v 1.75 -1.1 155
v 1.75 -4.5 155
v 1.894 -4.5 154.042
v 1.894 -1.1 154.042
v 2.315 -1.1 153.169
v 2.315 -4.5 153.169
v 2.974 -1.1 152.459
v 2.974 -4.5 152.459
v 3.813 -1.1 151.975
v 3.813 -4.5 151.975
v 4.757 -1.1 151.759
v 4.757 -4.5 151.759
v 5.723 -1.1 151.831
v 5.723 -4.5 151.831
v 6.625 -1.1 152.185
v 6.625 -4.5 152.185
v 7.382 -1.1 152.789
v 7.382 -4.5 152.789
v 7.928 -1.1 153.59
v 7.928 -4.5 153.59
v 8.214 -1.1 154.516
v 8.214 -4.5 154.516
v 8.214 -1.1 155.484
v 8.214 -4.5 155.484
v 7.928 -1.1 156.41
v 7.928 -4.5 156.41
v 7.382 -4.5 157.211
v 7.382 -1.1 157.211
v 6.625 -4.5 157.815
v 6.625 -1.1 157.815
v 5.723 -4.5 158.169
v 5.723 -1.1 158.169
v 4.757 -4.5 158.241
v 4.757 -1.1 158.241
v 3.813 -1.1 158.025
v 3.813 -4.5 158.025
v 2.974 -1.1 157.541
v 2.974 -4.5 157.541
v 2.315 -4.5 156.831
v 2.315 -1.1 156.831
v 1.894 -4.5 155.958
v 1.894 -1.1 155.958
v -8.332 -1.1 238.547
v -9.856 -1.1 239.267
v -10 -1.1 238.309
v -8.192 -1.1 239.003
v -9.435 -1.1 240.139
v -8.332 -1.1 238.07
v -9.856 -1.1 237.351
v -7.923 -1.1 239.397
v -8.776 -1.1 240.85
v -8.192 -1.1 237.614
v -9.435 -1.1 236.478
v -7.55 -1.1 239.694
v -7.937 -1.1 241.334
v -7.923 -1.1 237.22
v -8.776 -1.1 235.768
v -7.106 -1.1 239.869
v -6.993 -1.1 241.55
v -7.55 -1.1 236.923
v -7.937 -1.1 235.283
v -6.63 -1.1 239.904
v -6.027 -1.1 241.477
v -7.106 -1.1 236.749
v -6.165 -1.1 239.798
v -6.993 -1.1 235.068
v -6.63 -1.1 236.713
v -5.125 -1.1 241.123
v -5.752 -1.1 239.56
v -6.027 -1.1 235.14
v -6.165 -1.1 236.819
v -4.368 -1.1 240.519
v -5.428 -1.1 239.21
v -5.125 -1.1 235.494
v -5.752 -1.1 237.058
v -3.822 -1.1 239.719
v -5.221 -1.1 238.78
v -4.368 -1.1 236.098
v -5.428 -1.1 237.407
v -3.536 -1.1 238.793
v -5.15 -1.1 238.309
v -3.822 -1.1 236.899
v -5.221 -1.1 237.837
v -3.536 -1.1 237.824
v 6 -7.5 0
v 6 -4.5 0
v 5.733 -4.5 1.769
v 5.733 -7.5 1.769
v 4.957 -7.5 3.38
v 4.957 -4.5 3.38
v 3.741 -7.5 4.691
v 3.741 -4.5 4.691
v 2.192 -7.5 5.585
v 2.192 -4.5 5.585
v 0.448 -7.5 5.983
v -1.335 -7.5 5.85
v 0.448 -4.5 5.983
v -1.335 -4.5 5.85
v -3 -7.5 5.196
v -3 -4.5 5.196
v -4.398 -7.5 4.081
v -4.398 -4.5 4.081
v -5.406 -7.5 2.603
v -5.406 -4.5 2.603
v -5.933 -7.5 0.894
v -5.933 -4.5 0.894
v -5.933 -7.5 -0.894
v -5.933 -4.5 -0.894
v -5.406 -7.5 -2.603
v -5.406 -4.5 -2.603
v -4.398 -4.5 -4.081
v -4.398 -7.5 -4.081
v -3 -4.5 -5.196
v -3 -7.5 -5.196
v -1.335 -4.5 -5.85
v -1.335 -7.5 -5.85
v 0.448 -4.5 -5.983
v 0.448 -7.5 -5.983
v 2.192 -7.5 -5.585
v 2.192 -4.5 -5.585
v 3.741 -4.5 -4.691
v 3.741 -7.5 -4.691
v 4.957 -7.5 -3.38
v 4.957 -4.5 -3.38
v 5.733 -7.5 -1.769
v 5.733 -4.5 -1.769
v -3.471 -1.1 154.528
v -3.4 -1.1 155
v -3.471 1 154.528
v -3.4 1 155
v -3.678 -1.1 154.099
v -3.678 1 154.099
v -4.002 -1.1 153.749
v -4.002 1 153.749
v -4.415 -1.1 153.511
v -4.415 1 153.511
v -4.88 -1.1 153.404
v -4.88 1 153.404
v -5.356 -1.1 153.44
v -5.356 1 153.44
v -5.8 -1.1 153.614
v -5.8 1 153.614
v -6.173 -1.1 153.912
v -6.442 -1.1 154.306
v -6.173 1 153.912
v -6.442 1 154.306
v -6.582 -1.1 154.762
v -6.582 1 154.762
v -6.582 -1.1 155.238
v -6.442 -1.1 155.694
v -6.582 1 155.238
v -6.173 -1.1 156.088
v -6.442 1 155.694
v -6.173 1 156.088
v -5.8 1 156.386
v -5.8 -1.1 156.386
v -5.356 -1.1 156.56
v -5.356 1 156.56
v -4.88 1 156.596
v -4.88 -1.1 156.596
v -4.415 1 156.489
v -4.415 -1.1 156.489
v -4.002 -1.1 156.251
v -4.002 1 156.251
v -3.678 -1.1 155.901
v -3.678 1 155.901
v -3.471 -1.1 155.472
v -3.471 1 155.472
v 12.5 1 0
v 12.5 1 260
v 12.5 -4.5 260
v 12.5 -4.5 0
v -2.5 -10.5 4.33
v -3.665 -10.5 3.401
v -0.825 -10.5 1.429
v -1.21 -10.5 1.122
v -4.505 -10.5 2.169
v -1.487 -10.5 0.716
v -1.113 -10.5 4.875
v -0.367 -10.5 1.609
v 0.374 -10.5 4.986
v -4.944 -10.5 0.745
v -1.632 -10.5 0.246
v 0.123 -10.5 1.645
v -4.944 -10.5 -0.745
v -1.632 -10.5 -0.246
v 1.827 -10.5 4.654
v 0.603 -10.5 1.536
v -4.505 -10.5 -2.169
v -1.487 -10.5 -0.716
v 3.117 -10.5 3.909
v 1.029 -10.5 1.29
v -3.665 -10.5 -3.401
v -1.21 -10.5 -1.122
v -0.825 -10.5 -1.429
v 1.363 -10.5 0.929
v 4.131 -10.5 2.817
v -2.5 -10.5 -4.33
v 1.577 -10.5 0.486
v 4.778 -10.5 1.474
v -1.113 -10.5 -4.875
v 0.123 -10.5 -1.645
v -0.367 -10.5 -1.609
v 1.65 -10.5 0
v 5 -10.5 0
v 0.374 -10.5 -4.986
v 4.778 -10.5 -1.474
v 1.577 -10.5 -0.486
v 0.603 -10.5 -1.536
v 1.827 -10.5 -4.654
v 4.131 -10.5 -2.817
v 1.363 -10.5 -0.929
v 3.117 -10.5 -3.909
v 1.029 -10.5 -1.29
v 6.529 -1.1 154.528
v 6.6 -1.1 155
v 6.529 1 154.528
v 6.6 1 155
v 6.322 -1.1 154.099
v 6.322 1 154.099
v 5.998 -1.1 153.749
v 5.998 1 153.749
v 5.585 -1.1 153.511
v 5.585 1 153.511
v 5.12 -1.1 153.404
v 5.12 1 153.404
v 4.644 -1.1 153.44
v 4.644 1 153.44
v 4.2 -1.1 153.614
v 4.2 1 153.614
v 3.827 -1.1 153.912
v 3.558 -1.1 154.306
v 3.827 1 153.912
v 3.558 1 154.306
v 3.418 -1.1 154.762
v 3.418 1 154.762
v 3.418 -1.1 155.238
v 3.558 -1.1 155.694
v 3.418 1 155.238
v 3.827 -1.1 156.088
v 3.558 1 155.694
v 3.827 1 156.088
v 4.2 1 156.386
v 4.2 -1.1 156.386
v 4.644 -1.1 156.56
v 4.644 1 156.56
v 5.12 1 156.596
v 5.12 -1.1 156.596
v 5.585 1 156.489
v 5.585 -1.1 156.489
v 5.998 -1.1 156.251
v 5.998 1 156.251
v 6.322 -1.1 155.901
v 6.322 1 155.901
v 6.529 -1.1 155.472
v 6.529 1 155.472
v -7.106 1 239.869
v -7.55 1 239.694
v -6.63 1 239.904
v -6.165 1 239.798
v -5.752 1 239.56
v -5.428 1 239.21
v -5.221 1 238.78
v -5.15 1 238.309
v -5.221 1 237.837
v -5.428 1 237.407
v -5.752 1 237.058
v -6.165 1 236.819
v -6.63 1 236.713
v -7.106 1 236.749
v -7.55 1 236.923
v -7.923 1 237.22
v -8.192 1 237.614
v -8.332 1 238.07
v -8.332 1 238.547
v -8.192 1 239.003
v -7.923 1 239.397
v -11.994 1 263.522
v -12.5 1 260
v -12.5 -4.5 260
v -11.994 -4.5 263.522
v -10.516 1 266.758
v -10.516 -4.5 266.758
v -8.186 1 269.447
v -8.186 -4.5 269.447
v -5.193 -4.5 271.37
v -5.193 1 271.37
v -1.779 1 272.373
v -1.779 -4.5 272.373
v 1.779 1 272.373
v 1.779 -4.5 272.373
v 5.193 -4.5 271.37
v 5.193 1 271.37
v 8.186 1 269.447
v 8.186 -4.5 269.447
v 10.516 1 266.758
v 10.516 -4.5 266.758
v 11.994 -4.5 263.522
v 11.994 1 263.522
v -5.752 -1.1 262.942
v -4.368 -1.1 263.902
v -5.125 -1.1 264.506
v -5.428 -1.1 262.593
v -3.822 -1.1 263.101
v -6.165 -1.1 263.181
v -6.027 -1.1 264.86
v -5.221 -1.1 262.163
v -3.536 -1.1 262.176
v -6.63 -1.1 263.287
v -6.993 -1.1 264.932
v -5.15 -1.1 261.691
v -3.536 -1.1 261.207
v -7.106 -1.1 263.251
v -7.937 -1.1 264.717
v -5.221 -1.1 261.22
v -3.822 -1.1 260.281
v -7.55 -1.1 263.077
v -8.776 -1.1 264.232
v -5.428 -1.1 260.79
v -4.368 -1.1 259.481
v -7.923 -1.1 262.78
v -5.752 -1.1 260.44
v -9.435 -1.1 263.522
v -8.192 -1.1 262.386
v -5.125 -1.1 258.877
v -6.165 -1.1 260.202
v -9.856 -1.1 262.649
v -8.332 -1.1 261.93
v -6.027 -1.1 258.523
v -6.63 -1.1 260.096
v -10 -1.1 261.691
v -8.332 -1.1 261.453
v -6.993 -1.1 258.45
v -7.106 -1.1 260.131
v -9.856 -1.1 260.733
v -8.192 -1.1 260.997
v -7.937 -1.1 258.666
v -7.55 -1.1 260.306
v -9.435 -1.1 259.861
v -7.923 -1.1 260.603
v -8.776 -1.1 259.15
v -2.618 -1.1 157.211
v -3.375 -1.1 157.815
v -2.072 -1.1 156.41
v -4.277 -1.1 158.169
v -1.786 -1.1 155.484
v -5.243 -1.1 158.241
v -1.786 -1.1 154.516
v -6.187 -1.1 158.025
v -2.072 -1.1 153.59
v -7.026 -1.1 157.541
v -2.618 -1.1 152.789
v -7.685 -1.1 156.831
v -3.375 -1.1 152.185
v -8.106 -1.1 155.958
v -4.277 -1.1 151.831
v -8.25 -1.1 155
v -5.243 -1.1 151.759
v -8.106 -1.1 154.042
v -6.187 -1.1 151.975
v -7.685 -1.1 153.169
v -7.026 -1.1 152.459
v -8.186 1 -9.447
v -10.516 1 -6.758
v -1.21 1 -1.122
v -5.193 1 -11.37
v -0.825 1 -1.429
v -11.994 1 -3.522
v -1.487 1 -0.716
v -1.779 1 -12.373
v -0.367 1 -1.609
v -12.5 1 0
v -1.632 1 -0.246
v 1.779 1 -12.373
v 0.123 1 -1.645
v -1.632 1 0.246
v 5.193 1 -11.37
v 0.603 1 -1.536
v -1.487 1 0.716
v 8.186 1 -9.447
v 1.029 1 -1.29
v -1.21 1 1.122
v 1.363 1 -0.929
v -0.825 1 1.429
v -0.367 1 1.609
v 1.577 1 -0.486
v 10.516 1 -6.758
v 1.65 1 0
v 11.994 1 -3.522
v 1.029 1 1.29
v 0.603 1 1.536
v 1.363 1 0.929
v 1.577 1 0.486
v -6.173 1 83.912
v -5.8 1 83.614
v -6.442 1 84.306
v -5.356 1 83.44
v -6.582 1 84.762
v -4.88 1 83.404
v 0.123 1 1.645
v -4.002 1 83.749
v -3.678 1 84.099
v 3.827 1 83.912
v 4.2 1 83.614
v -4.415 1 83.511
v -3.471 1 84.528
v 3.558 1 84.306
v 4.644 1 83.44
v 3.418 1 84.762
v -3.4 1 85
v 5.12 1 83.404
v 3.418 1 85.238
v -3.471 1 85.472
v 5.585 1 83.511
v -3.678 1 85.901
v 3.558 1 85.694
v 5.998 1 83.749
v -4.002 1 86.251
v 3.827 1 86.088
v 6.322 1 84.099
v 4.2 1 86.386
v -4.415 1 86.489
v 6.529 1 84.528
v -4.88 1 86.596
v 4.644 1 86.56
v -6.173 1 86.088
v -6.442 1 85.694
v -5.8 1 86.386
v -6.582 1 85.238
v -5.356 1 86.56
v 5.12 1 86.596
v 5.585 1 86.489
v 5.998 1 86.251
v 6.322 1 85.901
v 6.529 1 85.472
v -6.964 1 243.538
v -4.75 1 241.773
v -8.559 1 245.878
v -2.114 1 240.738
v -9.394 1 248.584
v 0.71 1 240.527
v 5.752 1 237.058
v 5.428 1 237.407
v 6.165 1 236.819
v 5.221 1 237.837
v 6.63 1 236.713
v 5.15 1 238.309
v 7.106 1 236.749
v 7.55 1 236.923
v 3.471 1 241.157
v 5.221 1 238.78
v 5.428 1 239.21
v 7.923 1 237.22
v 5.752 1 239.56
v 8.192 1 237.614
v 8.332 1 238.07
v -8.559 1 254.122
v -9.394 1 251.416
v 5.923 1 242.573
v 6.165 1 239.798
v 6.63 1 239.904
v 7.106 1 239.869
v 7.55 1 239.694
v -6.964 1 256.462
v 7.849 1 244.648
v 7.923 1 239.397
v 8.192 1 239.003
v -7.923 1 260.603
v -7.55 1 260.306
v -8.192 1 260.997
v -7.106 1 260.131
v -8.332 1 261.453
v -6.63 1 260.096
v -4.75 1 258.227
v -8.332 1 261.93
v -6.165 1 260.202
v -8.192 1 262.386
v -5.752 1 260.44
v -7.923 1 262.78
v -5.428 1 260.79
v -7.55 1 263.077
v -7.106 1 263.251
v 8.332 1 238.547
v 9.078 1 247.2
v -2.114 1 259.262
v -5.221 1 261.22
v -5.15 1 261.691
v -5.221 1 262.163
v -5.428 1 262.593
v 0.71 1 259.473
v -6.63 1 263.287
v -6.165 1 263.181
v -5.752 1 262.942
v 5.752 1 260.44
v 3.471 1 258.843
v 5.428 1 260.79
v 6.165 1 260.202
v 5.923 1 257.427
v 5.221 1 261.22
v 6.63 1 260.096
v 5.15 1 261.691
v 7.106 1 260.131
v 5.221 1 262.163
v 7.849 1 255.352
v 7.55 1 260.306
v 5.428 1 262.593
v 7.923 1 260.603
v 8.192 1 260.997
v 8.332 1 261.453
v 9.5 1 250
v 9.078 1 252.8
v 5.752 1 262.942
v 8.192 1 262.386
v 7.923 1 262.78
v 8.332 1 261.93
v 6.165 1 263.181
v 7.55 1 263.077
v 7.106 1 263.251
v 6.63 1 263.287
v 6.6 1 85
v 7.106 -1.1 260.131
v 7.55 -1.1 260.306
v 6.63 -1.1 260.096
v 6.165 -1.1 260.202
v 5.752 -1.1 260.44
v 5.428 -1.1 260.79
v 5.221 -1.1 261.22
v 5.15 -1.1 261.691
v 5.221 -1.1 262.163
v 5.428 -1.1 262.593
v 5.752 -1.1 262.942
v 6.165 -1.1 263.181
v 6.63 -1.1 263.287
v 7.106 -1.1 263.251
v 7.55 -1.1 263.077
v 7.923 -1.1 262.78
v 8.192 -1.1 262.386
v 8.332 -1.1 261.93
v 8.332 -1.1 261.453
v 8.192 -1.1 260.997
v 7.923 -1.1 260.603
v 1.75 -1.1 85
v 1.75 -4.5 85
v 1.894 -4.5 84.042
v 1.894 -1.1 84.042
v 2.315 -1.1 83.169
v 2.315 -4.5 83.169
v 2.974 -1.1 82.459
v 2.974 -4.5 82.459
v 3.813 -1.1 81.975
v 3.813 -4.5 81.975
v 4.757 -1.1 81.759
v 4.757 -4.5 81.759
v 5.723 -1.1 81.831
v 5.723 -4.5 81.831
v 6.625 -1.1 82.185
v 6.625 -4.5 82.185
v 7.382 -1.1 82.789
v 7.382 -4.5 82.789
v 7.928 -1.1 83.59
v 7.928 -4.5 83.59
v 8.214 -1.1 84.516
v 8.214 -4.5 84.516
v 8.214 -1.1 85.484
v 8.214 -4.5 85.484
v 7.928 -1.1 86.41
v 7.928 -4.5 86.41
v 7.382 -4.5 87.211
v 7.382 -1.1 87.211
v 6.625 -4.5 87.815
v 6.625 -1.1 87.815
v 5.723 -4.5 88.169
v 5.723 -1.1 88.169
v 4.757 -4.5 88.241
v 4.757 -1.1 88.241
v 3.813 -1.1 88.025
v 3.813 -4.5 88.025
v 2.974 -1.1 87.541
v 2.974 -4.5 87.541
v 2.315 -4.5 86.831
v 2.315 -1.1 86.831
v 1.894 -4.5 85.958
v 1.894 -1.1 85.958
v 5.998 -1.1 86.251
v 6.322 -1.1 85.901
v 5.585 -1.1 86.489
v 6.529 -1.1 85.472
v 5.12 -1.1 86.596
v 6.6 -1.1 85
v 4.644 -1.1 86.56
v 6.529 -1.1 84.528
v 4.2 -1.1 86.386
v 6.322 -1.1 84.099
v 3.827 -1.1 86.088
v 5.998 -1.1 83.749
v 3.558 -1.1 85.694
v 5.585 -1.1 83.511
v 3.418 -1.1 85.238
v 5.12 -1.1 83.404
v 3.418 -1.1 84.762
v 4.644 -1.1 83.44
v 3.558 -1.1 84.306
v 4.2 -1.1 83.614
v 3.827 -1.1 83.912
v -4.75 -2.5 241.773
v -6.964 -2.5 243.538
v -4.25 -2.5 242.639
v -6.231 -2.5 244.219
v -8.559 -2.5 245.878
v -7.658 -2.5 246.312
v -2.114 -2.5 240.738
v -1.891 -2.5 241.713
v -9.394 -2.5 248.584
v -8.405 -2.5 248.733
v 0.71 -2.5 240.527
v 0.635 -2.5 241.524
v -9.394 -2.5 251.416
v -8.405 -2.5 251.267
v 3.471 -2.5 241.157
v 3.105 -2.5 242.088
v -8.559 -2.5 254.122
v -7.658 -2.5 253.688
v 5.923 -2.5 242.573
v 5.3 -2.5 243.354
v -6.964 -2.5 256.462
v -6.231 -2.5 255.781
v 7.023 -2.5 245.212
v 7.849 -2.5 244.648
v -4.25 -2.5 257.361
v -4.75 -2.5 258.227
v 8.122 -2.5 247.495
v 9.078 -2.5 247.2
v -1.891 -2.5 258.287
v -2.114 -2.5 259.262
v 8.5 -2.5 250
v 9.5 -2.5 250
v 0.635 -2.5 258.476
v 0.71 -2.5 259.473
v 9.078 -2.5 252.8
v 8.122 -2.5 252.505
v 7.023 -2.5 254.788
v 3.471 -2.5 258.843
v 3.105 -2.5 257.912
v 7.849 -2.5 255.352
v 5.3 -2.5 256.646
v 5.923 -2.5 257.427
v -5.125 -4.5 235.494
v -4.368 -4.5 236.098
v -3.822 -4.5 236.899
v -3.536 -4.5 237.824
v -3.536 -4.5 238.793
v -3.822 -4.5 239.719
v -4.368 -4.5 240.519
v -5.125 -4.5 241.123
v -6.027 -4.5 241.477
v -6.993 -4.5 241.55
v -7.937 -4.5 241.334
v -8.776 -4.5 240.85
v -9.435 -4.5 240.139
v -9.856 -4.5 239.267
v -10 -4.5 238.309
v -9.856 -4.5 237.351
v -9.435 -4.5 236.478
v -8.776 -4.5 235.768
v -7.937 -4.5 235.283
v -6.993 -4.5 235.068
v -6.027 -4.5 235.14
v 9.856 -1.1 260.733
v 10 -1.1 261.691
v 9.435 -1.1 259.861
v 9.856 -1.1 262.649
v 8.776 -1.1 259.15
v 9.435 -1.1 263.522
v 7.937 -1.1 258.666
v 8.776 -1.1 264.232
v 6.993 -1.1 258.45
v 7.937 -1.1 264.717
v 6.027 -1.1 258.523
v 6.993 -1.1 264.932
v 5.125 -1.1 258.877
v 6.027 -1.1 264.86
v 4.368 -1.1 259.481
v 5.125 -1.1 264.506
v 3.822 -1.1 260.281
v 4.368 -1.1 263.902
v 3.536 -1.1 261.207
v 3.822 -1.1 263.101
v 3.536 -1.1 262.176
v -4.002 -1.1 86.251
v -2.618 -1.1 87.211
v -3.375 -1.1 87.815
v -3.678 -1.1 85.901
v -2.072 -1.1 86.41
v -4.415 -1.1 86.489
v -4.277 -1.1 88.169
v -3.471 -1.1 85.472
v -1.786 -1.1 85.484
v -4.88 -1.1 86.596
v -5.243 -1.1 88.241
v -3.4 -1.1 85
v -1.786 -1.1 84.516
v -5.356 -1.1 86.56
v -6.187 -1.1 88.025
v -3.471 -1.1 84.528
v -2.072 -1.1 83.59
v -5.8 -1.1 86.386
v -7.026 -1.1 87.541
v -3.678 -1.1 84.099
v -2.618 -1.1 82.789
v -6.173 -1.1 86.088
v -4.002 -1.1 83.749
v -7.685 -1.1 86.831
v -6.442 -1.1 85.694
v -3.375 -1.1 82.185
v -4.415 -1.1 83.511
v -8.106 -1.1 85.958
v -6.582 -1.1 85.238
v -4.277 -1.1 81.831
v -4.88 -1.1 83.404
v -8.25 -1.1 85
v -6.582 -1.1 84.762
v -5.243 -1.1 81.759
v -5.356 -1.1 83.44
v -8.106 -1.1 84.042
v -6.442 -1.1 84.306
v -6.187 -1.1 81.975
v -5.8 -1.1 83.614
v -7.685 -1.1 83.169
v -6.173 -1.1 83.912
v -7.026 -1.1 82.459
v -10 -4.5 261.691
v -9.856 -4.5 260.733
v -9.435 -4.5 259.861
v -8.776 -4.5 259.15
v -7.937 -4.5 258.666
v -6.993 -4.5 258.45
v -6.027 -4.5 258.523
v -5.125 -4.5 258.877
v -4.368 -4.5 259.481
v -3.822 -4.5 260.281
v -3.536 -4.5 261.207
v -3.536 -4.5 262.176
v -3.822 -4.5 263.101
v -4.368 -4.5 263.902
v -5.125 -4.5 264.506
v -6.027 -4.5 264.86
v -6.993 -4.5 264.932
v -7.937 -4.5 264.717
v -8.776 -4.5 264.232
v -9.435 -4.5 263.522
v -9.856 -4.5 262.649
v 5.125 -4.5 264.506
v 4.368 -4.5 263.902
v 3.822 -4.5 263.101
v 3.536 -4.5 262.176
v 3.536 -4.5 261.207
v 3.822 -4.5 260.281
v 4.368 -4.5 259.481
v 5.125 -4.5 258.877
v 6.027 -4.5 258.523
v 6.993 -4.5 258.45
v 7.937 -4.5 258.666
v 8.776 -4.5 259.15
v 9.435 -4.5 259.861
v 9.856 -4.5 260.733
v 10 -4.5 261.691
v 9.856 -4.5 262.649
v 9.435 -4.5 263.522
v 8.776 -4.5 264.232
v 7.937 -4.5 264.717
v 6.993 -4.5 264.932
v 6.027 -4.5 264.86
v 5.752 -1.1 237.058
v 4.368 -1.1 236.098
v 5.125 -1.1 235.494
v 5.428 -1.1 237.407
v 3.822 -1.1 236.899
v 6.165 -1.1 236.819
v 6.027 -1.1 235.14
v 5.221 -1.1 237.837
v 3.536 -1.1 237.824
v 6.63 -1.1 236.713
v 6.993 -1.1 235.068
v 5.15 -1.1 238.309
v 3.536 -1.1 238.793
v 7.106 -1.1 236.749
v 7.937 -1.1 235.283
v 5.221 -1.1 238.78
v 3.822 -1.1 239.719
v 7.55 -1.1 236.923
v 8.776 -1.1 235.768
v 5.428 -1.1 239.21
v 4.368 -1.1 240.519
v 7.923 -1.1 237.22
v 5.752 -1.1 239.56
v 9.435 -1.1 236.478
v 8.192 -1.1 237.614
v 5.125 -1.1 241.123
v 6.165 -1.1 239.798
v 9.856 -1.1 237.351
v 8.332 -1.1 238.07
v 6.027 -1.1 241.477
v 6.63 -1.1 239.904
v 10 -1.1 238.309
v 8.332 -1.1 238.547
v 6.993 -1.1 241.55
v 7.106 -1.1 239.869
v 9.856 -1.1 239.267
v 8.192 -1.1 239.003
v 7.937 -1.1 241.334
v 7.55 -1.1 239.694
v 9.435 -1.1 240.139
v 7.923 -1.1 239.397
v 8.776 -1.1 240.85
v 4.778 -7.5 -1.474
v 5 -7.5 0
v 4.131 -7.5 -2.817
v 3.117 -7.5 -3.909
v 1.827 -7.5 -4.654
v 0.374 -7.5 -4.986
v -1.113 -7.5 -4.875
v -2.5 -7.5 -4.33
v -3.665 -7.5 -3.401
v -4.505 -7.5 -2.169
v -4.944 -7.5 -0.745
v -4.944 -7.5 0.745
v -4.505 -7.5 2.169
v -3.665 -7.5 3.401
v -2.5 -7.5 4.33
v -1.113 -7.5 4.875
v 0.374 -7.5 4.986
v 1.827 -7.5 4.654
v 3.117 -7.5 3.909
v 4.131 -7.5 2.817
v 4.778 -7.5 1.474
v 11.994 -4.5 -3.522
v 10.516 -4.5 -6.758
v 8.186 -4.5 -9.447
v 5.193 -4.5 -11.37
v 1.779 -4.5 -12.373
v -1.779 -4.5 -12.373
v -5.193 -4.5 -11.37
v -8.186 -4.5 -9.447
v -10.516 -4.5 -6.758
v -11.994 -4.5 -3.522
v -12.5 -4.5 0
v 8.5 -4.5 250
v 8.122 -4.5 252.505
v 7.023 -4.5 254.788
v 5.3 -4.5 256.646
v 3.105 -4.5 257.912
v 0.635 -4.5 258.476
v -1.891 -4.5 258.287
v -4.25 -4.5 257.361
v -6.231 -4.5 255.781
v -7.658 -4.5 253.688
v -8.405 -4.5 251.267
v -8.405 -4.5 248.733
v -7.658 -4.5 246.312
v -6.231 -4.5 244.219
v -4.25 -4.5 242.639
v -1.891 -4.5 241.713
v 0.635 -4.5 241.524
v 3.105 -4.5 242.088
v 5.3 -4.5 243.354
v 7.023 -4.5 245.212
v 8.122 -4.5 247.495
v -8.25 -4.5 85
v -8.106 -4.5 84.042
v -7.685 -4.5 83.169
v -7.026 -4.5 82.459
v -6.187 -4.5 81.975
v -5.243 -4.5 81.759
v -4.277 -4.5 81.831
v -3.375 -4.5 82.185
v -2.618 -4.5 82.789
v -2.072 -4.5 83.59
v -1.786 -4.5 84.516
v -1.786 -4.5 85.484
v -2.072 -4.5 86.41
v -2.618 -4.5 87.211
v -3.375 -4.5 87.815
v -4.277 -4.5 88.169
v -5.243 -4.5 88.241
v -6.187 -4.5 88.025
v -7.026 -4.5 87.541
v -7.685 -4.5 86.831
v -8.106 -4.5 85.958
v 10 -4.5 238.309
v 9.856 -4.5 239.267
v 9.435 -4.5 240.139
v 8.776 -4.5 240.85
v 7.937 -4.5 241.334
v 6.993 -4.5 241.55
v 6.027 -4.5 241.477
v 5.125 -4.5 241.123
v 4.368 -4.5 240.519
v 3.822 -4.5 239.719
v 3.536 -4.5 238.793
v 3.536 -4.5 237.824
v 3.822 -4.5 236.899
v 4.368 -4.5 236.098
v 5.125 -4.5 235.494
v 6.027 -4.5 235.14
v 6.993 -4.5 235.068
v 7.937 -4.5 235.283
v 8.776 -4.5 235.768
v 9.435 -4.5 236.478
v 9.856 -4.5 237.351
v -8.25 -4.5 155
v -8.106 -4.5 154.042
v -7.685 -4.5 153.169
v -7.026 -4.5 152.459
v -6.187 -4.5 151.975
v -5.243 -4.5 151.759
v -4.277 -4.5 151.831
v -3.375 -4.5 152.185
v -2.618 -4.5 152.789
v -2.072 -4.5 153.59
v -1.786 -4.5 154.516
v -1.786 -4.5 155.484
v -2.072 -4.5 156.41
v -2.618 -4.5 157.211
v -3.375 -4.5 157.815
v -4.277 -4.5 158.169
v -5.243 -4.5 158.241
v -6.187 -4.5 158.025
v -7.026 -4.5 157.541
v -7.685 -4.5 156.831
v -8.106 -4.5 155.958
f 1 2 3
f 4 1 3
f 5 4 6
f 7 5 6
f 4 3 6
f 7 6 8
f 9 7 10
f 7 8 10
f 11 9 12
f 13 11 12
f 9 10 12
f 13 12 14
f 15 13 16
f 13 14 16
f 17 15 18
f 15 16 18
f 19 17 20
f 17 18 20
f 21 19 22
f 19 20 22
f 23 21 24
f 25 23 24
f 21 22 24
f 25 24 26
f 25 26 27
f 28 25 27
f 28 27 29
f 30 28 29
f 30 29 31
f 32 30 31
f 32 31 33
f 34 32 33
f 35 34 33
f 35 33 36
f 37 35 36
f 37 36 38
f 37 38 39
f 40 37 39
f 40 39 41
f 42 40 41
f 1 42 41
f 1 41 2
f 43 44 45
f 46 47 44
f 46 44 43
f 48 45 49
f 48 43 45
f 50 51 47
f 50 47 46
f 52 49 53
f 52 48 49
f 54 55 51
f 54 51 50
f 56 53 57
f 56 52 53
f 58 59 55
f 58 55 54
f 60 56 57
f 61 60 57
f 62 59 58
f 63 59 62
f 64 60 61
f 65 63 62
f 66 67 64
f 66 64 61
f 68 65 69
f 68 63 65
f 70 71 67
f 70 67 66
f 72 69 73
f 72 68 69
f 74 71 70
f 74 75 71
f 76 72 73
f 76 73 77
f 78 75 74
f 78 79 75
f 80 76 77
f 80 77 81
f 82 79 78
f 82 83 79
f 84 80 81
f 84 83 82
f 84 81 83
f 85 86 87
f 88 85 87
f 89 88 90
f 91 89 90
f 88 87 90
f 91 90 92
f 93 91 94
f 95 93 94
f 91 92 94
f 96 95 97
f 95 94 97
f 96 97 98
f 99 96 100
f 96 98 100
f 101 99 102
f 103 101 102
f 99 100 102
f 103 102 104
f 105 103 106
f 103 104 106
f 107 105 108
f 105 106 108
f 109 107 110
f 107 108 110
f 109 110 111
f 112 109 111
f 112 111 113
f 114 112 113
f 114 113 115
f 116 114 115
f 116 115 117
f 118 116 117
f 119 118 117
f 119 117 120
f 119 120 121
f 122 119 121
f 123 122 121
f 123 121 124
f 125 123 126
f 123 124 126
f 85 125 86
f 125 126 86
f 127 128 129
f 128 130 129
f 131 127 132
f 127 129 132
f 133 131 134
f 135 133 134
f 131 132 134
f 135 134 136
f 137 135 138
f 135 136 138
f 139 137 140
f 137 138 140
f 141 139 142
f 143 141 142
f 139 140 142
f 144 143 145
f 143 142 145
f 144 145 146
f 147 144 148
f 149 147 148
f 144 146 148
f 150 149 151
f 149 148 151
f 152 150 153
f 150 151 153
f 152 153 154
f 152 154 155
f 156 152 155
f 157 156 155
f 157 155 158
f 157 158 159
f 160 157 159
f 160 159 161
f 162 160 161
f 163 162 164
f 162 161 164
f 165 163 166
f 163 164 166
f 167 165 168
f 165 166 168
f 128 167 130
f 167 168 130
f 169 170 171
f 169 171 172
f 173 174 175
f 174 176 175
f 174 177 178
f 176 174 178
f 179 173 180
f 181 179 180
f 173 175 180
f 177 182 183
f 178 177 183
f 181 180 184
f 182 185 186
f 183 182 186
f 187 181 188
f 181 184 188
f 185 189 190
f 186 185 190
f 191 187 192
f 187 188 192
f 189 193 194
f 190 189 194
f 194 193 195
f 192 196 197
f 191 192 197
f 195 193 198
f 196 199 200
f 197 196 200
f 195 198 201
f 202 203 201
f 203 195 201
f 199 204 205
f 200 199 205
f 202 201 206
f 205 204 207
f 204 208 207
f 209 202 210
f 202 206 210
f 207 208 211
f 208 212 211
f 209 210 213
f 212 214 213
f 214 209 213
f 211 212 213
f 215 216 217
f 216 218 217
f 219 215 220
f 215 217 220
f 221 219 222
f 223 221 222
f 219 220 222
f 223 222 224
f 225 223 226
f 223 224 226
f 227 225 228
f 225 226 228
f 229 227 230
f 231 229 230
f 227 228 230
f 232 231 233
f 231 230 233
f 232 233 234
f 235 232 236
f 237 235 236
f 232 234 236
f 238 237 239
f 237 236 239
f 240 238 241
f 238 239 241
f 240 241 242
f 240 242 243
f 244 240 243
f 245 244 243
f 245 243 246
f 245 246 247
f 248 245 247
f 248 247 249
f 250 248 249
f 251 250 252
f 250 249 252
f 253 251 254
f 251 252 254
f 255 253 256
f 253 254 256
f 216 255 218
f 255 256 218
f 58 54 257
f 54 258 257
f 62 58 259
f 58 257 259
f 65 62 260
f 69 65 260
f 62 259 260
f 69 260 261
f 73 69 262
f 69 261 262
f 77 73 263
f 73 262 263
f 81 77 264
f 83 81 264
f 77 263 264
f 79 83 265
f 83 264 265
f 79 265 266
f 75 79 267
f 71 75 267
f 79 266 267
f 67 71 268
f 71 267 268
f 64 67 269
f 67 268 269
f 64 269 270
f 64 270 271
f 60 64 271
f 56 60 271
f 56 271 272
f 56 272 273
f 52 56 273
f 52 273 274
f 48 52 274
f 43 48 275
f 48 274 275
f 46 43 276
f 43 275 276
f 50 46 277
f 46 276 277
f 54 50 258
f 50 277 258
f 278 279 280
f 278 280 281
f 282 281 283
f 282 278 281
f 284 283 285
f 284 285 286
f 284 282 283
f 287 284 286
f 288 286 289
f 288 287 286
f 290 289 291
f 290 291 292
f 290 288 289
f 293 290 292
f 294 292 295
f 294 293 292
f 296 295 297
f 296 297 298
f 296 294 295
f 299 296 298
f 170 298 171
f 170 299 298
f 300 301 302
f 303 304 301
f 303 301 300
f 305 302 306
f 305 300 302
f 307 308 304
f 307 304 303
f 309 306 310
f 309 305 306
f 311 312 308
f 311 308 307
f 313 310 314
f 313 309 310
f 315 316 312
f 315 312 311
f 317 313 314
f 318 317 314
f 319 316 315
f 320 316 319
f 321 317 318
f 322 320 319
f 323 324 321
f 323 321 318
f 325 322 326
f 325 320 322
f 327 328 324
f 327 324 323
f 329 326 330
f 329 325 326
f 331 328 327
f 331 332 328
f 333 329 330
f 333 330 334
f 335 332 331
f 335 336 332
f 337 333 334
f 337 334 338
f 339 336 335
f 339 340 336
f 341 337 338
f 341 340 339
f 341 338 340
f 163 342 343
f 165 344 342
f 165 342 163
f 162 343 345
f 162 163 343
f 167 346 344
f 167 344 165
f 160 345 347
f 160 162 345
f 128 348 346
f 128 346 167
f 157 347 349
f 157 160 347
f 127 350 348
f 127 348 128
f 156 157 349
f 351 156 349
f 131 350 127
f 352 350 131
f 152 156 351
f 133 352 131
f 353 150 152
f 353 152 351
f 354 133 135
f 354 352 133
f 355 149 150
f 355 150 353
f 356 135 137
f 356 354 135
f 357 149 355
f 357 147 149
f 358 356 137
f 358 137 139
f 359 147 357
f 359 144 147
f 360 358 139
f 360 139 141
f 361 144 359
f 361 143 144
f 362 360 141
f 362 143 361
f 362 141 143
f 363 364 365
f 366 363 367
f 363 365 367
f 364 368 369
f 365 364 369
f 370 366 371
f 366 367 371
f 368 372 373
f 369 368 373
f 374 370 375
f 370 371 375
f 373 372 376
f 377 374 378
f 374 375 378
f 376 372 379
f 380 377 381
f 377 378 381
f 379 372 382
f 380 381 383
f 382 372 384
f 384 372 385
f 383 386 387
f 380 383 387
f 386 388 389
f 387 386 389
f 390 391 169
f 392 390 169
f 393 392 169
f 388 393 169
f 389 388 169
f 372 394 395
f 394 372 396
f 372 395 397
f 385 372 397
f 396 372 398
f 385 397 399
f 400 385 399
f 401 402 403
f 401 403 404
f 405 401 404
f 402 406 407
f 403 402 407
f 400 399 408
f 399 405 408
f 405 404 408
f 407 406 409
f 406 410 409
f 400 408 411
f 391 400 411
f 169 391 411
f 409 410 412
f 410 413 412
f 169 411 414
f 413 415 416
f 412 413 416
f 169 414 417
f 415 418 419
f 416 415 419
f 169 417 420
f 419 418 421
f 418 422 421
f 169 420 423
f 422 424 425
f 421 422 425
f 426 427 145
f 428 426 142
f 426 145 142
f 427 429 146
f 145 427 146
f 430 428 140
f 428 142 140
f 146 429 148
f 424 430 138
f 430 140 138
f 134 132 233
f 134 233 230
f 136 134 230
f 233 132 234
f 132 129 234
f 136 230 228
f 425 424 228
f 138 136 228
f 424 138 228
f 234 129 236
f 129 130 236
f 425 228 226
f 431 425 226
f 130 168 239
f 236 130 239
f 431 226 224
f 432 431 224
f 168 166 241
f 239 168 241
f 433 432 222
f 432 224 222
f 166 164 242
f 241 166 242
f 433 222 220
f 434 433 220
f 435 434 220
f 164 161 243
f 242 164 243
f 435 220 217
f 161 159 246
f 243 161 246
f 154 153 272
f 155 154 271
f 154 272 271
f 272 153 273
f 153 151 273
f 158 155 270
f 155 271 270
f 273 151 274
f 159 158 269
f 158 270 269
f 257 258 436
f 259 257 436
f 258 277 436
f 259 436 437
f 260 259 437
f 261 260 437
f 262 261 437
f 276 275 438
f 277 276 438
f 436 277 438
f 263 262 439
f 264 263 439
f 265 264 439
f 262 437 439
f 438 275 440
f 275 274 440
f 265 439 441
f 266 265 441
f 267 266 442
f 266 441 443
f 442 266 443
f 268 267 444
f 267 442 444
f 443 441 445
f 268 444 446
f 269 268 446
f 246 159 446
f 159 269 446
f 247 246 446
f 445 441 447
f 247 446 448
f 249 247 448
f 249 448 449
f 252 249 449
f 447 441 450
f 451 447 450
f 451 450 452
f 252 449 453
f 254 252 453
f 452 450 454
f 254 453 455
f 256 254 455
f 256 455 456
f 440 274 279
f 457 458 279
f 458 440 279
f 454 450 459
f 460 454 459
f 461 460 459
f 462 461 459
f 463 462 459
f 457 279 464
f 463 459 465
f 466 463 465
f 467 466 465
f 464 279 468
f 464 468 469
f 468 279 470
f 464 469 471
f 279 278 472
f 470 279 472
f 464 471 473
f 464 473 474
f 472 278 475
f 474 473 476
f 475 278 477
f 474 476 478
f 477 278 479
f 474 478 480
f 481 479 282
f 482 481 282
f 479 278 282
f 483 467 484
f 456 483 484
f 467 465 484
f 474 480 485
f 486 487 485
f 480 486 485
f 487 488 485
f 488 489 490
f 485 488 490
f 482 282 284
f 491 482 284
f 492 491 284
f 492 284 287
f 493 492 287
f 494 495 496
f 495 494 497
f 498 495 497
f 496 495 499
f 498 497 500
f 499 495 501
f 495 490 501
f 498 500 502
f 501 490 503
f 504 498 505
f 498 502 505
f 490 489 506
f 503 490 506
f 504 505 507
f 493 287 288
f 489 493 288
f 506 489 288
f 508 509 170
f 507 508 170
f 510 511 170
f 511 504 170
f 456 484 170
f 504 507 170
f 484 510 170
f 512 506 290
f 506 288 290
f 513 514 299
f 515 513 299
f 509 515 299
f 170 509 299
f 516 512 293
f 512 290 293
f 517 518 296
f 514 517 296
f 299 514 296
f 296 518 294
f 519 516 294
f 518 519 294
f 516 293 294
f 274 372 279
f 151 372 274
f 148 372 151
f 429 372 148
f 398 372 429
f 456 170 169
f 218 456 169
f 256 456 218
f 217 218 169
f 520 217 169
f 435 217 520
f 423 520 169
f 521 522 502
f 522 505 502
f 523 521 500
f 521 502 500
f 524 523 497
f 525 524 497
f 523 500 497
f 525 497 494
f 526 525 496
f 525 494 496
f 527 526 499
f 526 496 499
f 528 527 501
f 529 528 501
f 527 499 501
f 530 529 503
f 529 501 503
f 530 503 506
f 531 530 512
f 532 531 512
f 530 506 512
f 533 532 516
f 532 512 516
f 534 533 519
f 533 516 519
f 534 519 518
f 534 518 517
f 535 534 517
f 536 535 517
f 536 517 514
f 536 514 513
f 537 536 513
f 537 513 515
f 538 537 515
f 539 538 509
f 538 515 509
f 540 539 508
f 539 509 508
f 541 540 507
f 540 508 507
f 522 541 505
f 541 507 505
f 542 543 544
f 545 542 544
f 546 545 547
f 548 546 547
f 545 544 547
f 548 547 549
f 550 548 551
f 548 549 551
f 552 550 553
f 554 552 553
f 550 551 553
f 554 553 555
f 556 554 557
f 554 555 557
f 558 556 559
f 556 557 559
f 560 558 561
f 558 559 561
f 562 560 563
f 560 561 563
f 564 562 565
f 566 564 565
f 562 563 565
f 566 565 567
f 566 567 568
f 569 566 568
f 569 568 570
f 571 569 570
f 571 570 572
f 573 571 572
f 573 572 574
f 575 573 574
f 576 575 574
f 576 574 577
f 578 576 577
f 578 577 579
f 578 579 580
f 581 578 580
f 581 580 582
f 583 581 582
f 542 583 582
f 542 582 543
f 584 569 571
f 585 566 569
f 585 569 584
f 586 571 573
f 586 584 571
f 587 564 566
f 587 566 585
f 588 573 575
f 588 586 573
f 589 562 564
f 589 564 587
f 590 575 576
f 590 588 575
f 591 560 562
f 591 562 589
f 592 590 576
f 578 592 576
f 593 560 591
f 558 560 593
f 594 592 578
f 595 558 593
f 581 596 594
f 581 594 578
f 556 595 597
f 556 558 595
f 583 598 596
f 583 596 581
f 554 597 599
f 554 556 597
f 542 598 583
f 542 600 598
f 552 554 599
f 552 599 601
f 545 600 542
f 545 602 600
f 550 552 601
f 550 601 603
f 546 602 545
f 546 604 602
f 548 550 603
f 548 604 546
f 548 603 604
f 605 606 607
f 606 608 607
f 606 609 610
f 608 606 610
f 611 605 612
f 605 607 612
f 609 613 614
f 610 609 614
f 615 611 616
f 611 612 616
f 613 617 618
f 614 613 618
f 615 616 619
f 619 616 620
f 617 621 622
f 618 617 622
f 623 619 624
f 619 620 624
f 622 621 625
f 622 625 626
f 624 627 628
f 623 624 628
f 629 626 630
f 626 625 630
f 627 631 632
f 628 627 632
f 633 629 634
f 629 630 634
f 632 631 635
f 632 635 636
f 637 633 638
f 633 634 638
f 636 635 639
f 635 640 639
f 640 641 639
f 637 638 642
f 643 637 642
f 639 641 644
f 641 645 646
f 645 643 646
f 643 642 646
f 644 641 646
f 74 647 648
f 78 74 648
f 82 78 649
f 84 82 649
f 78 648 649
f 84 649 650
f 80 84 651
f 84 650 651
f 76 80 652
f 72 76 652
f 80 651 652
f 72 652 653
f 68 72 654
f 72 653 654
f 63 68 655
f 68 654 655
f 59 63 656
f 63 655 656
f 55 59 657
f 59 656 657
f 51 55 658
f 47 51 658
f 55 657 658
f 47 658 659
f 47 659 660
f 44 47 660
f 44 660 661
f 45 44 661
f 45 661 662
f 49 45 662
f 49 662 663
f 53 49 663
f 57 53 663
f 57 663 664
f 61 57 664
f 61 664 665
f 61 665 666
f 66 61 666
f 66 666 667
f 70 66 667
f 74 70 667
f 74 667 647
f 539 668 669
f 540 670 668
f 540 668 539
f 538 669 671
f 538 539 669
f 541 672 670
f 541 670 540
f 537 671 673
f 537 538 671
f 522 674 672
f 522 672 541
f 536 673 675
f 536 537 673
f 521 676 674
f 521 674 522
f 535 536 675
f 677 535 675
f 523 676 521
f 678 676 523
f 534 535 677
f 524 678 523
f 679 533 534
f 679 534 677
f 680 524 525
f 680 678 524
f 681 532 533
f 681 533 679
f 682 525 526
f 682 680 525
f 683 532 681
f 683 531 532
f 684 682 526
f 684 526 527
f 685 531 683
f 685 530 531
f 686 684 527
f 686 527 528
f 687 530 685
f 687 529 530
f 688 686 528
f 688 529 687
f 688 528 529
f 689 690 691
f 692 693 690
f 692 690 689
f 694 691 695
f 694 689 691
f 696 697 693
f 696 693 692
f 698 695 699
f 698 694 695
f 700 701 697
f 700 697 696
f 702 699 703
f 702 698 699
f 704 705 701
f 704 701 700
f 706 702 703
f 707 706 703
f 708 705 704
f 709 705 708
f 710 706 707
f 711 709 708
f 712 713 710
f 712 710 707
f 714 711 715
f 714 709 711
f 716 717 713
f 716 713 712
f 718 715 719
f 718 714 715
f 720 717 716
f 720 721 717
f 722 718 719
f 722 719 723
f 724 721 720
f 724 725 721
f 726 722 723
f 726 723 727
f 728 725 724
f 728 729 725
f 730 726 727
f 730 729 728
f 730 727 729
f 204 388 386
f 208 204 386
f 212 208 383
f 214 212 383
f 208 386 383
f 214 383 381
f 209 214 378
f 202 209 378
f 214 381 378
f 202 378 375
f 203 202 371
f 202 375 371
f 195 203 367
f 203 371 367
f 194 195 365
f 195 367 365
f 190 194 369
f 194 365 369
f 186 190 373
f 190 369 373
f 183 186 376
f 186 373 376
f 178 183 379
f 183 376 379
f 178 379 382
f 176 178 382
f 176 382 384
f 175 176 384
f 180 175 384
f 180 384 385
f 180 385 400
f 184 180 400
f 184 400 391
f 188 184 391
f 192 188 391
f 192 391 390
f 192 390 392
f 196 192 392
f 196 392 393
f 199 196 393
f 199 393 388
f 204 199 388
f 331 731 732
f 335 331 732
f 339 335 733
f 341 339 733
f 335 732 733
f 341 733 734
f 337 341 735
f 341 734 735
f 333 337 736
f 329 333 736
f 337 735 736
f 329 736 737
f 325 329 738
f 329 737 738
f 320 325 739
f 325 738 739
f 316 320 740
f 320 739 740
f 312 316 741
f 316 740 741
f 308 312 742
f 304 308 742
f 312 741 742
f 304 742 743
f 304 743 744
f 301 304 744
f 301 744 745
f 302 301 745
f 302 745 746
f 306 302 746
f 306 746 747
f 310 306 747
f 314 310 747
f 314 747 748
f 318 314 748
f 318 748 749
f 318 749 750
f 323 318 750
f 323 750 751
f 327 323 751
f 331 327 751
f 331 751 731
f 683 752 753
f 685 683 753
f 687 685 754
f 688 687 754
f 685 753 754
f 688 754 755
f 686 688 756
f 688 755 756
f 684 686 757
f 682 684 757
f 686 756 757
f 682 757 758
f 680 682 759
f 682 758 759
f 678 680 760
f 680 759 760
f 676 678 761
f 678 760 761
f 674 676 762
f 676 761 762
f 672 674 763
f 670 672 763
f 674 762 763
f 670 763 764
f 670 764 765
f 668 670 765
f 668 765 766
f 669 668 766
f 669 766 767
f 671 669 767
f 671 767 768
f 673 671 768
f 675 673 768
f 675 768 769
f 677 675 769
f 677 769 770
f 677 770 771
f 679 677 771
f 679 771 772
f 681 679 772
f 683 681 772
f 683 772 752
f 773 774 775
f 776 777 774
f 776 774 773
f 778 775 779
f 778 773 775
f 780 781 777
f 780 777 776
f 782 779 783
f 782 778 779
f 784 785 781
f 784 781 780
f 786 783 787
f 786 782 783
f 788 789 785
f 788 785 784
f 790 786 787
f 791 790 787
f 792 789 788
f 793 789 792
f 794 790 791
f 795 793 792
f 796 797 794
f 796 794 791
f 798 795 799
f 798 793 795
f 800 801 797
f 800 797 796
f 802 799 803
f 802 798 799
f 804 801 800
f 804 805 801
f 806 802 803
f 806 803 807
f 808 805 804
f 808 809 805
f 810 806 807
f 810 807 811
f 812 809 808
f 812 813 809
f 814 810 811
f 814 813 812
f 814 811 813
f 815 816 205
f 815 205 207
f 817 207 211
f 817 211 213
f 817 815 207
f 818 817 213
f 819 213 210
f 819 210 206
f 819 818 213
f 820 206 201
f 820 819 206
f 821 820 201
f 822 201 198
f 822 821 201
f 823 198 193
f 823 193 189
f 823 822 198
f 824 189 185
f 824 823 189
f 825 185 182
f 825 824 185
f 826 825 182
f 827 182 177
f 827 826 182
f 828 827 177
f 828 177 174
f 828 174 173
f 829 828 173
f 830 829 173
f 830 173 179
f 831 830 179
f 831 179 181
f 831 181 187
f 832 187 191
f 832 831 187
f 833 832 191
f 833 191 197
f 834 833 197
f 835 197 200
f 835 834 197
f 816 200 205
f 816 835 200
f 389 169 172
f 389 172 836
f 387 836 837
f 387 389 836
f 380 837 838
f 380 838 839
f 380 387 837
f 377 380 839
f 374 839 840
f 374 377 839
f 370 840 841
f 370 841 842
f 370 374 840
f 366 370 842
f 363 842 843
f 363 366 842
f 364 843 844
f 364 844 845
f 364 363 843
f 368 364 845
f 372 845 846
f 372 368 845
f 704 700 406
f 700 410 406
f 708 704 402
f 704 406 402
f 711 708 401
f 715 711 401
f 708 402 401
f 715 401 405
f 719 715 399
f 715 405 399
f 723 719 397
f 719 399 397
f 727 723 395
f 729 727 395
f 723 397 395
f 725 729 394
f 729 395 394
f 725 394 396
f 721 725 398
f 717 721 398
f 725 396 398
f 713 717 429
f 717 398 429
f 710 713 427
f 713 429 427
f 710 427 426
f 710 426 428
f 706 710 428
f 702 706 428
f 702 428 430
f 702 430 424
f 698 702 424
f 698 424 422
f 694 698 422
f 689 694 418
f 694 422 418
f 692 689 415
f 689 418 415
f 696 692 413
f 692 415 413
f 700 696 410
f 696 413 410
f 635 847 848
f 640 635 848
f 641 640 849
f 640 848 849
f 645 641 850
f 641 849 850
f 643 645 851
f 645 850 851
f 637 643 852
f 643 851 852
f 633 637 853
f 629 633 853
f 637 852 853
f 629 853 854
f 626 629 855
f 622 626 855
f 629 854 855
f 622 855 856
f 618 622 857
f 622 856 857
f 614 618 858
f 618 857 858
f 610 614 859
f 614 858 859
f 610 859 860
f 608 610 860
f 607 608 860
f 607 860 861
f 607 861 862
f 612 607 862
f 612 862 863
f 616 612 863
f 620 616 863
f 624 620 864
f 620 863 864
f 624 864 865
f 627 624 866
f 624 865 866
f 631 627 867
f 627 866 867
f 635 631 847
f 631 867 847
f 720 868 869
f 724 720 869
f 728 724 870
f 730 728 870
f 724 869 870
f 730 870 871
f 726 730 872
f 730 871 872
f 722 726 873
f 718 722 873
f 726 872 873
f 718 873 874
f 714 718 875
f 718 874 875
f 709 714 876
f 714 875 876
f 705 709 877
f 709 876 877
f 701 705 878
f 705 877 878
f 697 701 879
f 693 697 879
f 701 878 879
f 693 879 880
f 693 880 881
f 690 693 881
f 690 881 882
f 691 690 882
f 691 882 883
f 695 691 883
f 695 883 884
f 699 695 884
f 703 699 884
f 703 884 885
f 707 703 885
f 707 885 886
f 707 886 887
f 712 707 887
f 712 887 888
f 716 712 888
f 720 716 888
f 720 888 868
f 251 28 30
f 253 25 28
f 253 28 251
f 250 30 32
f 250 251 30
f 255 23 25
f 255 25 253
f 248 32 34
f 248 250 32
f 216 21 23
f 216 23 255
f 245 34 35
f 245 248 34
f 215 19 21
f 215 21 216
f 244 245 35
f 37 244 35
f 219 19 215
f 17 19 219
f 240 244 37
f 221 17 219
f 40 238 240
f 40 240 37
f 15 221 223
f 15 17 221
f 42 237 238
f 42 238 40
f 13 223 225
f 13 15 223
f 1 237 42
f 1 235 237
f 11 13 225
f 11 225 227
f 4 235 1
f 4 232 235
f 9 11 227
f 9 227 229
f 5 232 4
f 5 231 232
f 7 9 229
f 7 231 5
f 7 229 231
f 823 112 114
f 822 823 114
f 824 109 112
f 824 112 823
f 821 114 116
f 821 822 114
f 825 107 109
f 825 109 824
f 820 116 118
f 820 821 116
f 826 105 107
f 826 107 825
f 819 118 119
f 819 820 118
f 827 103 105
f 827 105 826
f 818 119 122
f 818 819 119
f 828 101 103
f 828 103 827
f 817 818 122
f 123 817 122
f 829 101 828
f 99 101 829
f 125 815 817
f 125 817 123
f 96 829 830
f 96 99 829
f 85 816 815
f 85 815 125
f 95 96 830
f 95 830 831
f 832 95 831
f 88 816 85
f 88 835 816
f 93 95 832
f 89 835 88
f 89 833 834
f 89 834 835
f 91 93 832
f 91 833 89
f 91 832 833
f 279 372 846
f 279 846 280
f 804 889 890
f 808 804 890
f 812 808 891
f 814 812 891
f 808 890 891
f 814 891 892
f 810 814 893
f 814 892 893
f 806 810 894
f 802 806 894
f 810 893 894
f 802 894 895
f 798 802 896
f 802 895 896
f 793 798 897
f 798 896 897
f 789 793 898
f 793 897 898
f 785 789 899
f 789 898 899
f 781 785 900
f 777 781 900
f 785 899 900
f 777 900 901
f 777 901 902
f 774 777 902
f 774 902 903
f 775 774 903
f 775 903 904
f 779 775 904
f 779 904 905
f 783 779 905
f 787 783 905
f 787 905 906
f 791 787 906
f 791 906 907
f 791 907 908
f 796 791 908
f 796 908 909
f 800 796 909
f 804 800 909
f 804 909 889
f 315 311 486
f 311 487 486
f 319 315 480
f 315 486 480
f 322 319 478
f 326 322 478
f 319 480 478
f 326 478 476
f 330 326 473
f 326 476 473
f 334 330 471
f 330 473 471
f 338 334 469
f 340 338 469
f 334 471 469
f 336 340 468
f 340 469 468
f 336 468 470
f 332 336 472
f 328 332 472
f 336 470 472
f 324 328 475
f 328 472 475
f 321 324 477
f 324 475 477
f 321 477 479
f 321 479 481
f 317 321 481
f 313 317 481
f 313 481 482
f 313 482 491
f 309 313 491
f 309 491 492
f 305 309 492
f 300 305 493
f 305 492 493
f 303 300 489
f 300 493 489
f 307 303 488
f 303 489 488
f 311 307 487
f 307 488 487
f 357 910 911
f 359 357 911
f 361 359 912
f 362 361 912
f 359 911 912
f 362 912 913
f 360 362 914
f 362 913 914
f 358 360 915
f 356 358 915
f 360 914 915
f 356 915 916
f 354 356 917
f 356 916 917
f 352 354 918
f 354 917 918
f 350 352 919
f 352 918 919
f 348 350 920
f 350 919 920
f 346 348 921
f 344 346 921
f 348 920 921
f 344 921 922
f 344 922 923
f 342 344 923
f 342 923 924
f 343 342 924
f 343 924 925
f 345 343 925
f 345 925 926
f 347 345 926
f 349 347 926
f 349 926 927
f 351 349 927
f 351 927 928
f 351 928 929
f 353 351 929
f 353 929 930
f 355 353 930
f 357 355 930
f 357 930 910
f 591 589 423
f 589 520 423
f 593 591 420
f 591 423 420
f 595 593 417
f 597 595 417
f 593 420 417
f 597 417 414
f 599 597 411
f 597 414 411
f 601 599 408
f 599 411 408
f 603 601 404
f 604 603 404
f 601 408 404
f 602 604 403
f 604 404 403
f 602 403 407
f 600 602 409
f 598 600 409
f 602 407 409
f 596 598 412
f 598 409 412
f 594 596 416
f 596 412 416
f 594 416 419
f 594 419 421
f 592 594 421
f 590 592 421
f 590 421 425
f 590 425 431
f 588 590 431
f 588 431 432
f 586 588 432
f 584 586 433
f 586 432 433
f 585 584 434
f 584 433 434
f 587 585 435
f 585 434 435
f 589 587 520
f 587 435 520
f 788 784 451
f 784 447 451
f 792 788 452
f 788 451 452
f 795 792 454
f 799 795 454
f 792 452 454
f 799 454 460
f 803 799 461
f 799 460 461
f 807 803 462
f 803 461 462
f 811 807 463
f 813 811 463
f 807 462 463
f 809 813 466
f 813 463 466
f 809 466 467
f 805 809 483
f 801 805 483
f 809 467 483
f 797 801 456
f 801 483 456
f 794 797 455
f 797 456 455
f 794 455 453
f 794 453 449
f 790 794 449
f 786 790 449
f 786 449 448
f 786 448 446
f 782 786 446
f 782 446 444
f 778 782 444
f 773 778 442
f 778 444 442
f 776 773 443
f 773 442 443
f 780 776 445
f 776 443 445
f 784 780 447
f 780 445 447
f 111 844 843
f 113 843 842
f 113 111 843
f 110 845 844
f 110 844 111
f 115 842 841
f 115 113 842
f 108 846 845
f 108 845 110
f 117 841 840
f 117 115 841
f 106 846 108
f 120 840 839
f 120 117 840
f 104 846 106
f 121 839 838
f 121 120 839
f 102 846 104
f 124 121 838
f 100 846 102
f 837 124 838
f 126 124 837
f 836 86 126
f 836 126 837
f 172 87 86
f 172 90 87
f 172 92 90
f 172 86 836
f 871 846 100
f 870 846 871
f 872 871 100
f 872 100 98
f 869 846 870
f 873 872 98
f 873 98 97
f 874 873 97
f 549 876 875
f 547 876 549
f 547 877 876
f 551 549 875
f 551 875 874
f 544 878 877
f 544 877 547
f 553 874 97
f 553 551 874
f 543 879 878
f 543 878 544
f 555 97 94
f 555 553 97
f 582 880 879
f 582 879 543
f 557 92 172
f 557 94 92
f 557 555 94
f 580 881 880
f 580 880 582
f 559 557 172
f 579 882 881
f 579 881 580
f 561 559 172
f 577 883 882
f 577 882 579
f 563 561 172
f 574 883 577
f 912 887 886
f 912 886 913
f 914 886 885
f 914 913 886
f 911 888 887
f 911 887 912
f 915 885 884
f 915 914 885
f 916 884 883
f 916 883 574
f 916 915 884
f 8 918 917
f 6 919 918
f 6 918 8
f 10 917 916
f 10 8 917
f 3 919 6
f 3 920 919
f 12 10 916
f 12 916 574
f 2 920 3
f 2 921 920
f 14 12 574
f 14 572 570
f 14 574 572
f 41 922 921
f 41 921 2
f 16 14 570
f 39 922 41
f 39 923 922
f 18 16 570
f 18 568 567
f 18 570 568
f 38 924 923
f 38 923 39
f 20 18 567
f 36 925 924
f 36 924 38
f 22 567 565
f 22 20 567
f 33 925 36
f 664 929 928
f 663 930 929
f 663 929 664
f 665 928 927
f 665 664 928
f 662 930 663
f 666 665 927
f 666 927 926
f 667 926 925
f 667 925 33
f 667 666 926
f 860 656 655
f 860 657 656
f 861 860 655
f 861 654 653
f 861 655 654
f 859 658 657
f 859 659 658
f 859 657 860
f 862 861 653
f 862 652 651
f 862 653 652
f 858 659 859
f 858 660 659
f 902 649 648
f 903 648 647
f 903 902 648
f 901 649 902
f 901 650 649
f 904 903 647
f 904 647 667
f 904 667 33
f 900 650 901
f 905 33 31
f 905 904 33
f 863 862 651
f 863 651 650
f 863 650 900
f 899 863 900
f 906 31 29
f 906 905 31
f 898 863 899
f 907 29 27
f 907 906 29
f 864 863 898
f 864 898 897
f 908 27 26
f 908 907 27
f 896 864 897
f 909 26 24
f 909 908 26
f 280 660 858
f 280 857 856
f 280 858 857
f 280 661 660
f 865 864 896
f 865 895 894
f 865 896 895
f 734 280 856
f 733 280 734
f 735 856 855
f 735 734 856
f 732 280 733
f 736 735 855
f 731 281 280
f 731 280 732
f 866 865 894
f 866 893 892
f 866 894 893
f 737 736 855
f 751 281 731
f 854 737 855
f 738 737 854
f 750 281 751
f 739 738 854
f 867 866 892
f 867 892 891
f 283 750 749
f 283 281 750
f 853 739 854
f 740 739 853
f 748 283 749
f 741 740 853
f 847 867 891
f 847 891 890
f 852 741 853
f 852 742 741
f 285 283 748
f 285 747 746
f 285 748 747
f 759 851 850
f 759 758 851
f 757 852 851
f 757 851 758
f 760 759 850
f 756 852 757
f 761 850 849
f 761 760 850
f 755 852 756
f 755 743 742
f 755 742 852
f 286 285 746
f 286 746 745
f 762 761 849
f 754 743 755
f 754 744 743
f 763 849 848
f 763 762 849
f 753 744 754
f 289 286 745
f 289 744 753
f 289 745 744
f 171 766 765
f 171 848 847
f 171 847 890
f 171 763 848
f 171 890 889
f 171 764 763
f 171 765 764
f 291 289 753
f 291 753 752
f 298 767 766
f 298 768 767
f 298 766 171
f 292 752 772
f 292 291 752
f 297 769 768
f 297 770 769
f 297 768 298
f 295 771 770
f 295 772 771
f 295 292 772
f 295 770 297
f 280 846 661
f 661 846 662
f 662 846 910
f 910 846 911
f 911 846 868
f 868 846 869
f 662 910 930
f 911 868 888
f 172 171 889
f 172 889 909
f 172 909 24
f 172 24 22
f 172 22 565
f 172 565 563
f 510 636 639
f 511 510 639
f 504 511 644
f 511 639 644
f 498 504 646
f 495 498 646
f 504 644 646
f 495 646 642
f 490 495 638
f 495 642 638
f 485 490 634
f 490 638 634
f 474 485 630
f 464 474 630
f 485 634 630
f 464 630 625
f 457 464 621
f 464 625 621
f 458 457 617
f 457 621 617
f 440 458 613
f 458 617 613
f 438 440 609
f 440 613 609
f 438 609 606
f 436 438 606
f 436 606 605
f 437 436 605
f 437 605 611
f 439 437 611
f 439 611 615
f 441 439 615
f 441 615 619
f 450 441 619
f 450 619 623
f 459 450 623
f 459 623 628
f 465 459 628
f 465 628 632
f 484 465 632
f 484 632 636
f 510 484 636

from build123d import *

# Parameters (mm, degrees)
EXTRUDE_1_DEPTH              = 10.5
EXTRUDE_1_DEPTH_BACK         = 10.5
SKETCH_1_R                   = 5
EXTRUDE_3_DEPTH              = 4.5
EXTRUDE_3_DEPTH_BACK         = 4.5
SKETCH_7_R                   = 6
EXTRUDE_4_DEPTH              = 3
EXTRUDE_START                = 3
SKETCH_8_R                   = 6
EXTRUDE_5_DEPTH              = 3
SKETCH_9_R                   = 9.5
CUT_EXTRUDE_1_DEPTH          = 7
SKETCH_10_R                  = 8.5
CUT_EXTRUDE_2_DEPTH          = 274.096136919
HOLE_WIZARD_M4_1_D           = 3.3
SKETCH_22_W                  = 47.656916312
SKETCH_22_H                  = 14.908676054
CUT_EXTRUDE_3_DEPTH          = 1111
SKETCH_23_R                  = 9.5
SKETCH_23_R_2                = 8.5
EXTRUDE_6_DEPTH              = 2
HOLE_WIZARD_M3_1_D           = 3.2
HOLE_WIZARD_M3_1_CBORE_D     = 6.5
HOLE_WIZARD_M3_1_CBORE_DEPTH = 3.4
PATTERN_CIRCULAR_1_COUNT     = 6
HOLE_WIZARD_M3_2_D           = 3.2
HOLE_WIZARD_M3_2_CBORE_D     = 6.5
HOLE_WIZARD_M3_2_CBORE_DEPTH = 3.4
PATTERN_LINEAR_1_COUNT       = 3
PATTERN_LINEAR_1_PITCH       = 70
PATTERN_LINEAR_1_COUNT_DIR2  = 2
PATTERN_LINEAR_1_PITCH_DIR2  = 10
SKETCH_31_R                  = 3.25
EXTRUDE_7_DEPTH              = 5.5


with BuildPart() as part:
    # 스케치1 → 보스-돌출1 (new, two sides: drawn at the far end of the back side and taken through both)
    with BuildSketch(Plane(origin=(0, 0, 0), x_dir=(1, 0, 0), z_dir=(0, 1, 0)).offset(-EXTRUDE_1_DEPTH_BACK)):
        Circle(SKETCH_1_R)
    extrude(amount=EXTRUDE_1_DEPTH + EXTRUDE_1_DEPTH_BACK)

    # 스케치6 → 보스-돌출3 (add, two sides: drawn at the far end of the back side and taken through both)
    with BuildSketch(Plane(origin=(0, 0, 0), x_dir=(1, 0, 0), z_dir=(0, 1, 0)).offset(-EXTRUDE_3_DEPTH_BACK)):
        with BuildLine():
            Line((-12.5, 0), (-12.5, -260))
            ThreePointArc((-12.5, -260), (0, -272.5), (12.5, -260))
            Line((12.5, -260), (12.5, 0))
            ThreePointArc((12.5, 0), (0, 12.5), (-12.5, 0))
        make_face()
    extrude(amount=EXTRUDE_3_DEPTH + EXTRUDE_3_DEPTH_BACK)

    # 스케치7 → 보스-돌출4 (add)
    with BuildSketch(Plane.XZ.offset(4.5)):
        Circle(SKETCH_7_R)
    extrude(amount=EXTRUDE_4_DEPTH)

    # 스케치8 → 보스-돌출5 (add)
    with BuildSketch(Plane(origin=(0, 4.5, 0), x_dir=(1, 0, 0), z_dir=(0, 1, 0)).offset(EXTRUDE_START)):
        Circle(SKETCH_8_R)
    extrude(amount=-EXTRUDE_5_DEPTH)

    # 스케치9 → 컷-돌출1 (cut)
    with BuildSketch(Plane.XZ.offset(4.5)):
        with Locations((0, 250)):
            Circle(SKETCH_9_R)
    extrude(amount=-CUT_EXTRUDE_1_DEPTH, mode=Mode.SUBTRACT)

    # 스케치10 → 컷-돌출2 (cut, through all)
    with BuildSketch(Plane.XZ.offset(-2.5)):
        with Locations((0, 250)):
            Circle(SKETCH_10_R)
    extrude(amount=-CUT_EXTRUDE_2_DEPTH, mode=Mode.SUBTRACT)

    # M4 탭을 위한 탭 드릴1 (through all)
    with Locations(Plane(origin=(0, -10.5, 0), x_dir=(-1, 0, 0), z_dir=(0, -1, 0))):
        with Locations((0, 0)):
            Hole(HOLE_WIZARD_M4_1_D / 2)

    # 스케치22 → 컷-돌출3 (cut, symmetric)
    with BuildSketch(Plane.XY):
        with Locations((0.455125877, 8.454338027)):
            Rectangle(SKETCH_22_W, SKETCH_22_H)
    extrude(amount=CUT_EXTRUDE_3_DEPTH, both=True, mode=Mode.SUBTRACT)

    # 스케치23 → 보스-돌출6 (add)
    with BuildSketch(Plane.XZ.offset(4.5)):
        with Locations((0, 250)):
            Circle(SKETCH_23_R)
        with Locations((0, 250)):
            Circle(SKETCH_23_R_2, mode=Mode.SUBTRACT)
    extrude(amount=-EXTRUDE_6_DEPTH)

    # M3 육각 소켓 머리 캡 나사용 카운터보어1 (through all)
    with Locations(Plane(origin=(0, -4.5, 0), x_dir=(-1, 0, 0), z_dir=(0, -1, 0))):
        with Locations((6.75, -261.691342951)):
            hole_wizard_m3_1 = CounterBoreHole(HOLE_WIZARD_M3_1_D / 2, HOLE_WIZARD_M3_1_CBORE_D / 2, HOLE_WIZARD_M3_1_CBORE_DEPTH)

    # 원형 패턴1: M3 육각 소켓 머리 캡 나사용 카운터보어1 ×6 about axis, 2 skipped
    pattern_circular_1_axis = Axis((0, -2.5, 250), (0, -1, 0))
    add([hole_wizard_m3_1.rotate(pattern_circular_1_axis, i * 360 / PATTERN_CIRCULAR_1_COUNT) for i in range(1, PATTERN_CIRCULAR_1_COUNT) if i not in (1, 4)], mode=Mode.SUBTRACT)

    # M3 육각 소켓 머리 캡 나사용 카운터보어2 (through all)
    with Locations(Plane(origin=(0, -4.5, 0), x_dir=(-1, 0, 0), z_dir=(0, -1, 0))):
        with Locations((5, -15)):
            hole_wizard_m3_2 = CounterBoreHole(HOLE_WIZARD_M3_2_D / 2, HOLE_WIZARD_M3_2_CBORE_D / 2, HOLE_WIZARD_M3_2_CBORE_DEPTH)

    # 선형 패턴1: Hole Wizard M3 _ _ _ _ _ _2 3 × 2
    with Locations(*[(j * PATTERN_LINEAR_1_PITCH_DIR2, 0, i * PATTERN_LINEAR_1_PITCH) for i in range(PATTERN_LINEAR_1_COUNT) for j in range(PATTERN_LINEAR_1_COUNT_DIR2) if (i, j) != (0, 0)]):
        add(hole_wizard_m3_2, mode=Mode.SUBTRACT)

    # 스케치31 → 보스-돌출7 (add)
    with BuildSketch(Plane.XZ.offset(4.5)):
        with Locations((5, 15)):
            Circle(SKETCH_31_R)
        with Locations((-5, 15)):
            Circle(SKETCH_31_R)
    extrude(amount=-EXTRUDE_7_DEPTH)


solid = part.part
